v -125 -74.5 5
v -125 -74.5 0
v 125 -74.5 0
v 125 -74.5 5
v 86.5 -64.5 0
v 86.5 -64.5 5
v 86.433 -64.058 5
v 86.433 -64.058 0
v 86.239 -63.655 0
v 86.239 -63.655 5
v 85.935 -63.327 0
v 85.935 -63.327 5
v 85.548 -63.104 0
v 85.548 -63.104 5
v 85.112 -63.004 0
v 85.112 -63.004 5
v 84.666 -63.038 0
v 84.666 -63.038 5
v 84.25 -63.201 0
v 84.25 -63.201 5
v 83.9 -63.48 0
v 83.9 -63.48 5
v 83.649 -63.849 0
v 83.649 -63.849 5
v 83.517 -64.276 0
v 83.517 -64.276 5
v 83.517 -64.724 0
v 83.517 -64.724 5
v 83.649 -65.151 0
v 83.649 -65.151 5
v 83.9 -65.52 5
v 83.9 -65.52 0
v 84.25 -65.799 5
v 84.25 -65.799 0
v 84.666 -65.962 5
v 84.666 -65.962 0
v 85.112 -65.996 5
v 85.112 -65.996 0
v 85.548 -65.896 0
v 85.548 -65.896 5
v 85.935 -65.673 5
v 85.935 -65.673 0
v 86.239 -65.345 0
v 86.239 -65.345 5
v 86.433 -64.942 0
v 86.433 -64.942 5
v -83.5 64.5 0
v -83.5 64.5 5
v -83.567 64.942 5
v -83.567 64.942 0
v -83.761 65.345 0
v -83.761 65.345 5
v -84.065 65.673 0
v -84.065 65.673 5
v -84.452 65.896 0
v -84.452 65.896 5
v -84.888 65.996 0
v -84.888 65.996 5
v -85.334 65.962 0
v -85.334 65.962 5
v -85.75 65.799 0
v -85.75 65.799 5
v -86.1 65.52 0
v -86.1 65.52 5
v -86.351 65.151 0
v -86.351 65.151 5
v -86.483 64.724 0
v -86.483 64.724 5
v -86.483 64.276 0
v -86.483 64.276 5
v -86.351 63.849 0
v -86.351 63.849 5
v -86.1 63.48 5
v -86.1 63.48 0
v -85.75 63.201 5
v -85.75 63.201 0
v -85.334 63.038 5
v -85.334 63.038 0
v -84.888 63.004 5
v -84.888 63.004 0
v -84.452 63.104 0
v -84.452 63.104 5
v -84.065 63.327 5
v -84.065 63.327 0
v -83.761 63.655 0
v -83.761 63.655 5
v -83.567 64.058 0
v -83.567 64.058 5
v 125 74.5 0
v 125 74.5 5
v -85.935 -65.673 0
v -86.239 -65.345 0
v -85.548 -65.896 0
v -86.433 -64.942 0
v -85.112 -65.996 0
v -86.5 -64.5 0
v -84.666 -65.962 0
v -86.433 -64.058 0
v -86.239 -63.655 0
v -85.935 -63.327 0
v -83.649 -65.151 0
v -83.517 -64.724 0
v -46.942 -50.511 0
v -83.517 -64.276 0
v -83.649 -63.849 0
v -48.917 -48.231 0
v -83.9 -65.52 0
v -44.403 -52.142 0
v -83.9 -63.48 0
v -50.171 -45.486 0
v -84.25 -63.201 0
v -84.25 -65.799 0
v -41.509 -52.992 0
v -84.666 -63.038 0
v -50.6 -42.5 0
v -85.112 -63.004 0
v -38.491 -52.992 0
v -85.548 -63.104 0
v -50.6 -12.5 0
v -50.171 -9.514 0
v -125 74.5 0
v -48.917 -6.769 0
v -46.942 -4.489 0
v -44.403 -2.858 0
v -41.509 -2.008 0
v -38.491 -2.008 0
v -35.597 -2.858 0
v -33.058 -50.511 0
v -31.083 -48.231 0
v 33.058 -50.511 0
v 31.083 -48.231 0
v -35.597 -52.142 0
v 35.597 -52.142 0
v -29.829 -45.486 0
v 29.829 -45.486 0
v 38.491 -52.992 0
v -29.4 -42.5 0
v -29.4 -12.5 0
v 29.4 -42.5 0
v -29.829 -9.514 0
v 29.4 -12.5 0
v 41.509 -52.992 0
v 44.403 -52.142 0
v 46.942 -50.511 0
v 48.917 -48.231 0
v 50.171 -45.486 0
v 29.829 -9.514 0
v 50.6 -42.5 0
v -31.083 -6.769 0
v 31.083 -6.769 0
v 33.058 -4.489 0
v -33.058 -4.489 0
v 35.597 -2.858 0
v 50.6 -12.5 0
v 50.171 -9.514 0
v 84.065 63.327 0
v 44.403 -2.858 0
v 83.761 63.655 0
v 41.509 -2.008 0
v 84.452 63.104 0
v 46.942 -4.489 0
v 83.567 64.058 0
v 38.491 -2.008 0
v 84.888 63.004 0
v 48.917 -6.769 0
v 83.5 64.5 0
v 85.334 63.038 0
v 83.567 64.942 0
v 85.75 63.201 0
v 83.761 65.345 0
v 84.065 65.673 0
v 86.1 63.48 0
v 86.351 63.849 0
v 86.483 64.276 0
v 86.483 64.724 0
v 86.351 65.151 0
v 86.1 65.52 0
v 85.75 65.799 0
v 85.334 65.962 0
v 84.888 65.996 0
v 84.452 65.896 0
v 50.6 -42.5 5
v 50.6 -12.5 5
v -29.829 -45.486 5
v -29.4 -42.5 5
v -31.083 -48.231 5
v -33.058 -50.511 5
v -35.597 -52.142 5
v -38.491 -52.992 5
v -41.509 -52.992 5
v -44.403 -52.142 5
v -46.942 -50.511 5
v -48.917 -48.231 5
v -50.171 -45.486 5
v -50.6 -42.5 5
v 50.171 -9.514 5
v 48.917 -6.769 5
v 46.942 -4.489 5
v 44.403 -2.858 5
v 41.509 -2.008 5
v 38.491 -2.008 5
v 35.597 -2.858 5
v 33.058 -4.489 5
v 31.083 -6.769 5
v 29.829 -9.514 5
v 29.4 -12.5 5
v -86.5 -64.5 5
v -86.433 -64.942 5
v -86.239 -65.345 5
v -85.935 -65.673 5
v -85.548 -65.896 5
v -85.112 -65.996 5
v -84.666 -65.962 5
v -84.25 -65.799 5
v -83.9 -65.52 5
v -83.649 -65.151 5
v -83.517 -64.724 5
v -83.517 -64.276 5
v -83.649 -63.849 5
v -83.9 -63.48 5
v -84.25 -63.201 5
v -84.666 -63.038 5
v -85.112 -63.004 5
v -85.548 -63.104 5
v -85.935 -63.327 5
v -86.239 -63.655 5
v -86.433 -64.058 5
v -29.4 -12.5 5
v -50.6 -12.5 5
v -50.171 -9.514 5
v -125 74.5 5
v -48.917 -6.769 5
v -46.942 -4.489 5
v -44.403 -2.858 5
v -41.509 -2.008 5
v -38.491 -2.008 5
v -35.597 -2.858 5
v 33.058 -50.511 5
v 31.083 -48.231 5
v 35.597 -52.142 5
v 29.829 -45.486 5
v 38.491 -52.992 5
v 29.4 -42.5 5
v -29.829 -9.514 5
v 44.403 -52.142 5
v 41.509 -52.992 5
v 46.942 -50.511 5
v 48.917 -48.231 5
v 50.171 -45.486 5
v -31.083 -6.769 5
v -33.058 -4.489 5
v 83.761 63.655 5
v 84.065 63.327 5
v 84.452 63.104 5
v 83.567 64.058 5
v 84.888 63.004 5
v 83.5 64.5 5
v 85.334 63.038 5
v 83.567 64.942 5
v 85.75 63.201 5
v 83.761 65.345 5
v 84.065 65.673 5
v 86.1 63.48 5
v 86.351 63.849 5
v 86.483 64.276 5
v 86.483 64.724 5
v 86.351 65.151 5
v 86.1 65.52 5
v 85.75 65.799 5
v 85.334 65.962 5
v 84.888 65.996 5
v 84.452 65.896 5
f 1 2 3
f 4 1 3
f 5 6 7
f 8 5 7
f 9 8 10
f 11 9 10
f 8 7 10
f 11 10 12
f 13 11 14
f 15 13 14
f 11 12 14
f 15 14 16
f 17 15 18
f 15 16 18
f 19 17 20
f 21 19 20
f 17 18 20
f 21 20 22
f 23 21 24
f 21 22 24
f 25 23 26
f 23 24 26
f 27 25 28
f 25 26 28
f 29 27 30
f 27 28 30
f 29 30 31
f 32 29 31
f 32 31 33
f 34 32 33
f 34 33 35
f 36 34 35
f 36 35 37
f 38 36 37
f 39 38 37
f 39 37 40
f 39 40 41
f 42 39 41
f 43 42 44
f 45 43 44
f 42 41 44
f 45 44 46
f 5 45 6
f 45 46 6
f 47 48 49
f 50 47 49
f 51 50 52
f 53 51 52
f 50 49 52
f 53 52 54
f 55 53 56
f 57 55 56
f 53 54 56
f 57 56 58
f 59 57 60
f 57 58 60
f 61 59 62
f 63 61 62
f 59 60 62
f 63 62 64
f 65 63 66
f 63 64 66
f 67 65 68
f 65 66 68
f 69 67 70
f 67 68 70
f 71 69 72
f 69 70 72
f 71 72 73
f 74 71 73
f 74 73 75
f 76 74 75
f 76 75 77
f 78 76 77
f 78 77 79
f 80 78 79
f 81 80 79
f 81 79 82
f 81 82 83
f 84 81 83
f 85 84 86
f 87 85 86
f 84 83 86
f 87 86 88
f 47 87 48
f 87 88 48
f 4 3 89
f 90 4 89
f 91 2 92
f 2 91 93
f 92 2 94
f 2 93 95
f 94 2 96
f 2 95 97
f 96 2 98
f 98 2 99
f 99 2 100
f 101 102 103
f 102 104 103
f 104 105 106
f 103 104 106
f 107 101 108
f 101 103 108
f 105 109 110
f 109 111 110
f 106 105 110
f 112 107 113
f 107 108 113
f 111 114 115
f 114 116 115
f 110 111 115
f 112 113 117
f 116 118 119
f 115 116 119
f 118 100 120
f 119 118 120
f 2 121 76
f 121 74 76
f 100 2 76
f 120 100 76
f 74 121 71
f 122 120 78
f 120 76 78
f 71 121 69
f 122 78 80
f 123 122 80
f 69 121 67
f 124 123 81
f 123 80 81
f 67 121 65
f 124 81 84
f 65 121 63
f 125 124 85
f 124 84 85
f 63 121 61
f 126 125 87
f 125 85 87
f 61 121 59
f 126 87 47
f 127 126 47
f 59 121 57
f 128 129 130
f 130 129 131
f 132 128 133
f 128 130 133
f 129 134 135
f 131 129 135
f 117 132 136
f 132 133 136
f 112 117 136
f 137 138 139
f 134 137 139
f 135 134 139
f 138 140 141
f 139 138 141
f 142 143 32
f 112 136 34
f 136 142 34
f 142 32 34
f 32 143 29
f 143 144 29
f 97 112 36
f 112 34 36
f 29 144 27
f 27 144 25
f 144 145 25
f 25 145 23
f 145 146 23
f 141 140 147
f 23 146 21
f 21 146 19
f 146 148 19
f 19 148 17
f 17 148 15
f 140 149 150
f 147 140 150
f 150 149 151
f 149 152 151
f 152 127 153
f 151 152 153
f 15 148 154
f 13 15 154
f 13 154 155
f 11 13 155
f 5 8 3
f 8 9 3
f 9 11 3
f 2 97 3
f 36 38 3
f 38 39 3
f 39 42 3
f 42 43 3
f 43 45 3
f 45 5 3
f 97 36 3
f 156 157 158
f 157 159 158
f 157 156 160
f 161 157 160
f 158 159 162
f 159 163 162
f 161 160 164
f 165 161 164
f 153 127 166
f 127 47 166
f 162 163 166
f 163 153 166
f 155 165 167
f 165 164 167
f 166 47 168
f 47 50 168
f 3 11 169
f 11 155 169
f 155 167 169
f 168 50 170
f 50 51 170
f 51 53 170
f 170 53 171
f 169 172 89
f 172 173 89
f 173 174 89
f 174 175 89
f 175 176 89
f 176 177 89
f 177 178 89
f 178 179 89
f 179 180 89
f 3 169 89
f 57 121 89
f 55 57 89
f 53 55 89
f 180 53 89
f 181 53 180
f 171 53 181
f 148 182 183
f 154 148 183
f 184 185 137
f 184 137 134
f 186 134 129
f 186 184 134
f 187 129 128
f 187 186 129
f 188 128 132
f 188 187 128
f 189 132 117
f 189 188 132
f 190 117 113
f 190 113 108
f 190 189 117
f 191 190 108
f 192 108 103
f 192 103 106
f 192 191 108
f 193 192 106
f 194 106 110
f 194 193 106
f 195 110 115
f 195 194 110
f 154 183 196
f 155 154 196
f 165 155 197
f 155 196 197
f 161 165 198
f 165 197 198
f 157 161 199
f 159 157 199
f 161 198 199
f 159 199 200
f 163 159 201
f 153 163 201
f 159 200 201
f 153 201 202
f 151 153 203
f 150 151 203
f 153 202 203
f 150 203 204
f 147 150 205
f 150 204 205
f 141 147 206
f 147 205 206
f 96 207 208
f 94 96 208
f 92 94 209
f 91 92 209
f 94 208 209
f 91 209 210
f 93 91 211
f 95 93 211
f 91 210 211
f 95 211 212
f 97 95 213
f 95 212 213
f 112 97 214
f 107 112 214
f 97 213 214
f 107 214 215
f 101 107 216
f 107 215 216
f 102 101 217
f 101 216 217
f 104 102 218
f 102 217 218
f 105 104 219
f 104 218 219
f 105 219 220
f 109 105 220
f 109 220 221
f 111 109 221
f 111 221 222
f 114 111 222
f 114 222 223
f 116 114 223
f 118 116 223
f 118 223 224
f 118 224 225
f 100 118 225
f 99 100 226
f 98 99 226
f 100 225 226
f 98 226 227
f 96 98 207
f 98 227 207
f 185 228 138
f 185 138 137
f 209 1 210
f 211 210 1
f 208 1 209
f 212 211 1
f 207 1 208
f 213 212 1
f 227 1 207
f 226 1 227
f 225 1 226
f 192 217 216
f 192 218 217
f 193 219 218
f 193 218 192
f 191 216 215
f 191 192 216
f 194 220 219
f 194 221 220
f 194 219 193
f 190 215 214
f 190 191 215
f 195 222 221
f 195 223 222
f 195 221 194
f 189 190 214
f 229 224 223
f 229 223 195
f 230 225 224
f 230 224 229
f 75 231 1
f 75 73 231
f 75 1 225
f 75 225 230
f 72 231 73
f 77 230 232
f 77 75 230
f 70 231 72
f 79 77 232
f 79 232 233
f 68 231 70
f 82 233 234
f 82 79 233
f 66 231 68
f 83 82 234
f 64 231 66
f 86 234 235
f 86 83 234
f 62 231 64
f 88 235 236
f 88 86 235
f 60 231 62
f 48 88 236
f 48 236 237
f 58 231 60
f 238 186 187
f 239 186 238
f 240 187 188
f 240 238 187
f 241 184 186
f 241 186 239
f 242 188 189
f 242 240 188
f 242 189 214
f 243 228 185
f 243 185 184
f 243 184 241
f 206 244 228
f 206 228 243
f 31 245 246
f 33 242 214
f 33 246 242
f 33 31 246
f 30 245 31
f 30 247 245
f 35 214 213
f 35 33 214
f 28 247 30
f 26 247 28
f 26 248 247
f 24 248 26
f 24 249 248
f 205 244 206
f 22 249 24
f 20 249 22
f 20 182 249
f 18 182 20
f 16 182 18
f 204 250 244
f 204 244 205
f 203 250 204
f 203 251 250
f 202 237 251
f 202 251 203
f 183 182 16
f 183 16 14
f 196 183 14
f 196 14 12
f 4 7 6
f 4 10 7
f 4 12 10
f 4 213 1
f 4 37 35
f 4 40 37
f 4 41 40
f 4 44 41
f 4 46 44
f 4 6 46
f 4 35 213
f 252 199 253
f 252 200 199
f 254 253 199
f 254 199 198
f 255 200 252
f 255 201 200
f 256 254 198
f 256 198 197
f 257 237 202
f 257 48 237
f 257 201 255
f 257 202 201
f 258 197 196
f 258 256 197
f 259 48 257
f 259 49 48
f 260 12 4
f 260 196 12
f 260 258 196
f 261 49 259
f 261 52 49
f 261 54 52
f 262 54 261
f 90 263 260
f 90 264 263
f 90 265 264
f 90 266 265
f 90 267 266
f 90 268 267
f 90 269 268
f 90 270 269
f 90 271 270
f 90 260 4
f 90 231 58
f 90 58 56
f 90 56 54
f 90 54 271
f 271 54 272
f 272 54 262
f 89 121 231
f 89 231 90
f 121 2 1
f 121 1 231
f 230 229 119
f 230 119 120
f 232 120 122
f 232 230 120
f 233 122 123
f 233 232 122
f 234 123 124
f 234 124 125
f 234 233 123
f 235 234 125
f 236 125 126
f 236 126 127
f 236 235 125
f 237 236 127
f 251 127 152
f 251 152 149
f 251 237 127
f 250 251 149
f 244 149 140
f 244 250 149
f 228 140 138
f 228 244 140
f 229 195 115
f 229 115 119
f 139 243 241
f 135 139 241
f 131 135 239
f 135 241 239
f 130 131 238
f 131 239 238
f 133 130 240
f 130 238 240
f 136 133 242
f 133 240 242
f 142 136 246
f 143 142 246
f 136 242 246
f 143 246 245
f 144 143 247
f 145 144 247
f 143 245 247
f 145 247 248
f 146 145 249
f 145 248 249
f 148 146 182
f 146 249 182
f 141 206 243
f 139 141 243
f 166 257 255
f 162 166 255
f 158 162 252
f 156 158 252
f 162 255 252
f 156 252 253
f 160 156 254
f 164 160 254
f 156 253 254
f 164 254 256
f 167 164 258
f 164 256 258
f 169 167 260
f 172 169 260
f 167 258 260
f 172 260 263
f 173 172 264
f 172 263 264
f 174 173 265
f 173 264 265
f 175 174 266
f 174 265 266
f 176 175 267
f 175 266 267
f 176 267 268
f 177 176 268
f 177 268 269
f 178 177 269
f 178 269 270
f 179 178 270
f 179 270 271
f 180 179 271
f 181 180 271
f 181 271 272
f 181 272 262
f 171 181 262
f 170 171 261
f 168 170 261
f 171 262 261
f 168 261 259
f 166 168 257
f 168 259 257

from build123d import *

# Parameters (mm, degrees)
ESQUISSE1_W             = 250
ESQUISSE1_H             = 149
BOSS_EXTRU_1_DEPTH      = 5
ESQUISSE2_R             = 1.5
ENL_V_MAT_EXTRU_1_DEPTH = 5
ENL_V_MAT_EXTRU_2_DEPTH = 5


with BuildPart() as part:
    # Esquisse1 → Boss.-Extru.1 (new body)
    with BuildSketch(Plane.XY):
        Rectangle(ESQUISSE1_W, ESQUISSE1_H)
    extrude(amount=BOSS_EXTRU_1_DEPTH)

    # Esquisse2 → Enlèv. mat.-Extru.1 (cut)
    with BuildSketch(Plane.XY.offset(5)):
        with Locations((-85, 64.5)):
            Circle(ESQUISSE2_R)
        with Locations(Location((-85, -64.5, 0), (0, 0, 180))):
            Circle(ESQUISSE2_R)
        with Locations((85, -64.5)):
            Circle(ESQUISSE2_R)
        with Locations(Location((85, 64.5, 0), (0, 0, 180))):
            Circle(ESQUISSE2_R)
    extrude(amount=-ENL_V_MAT_EXTRU_1_DEPTH, mode=Mode.SUBTRACT)

    # Esquisse3 → Enlèv. mat.-Extru.2 (cut)
    with BuildSketch(Plane.XY.offset(5)):
        with BuildLine():
            Line((-29.4, -12.5), (-29.4, -42.5))
            ThreePointArc((-29.4, -42.5), (-40, -53.1), (-50.6, -42.5))
            Line((-50.6, -42.5), (-50.6, -12.5))
            ThreePointArc((-50.6, -12.5), (-40, -1.9), (-29.4, -12.5))
        make_face()
        with BuildLine():
            Line((29.4, -12.5), (29.4, -42.5))
            ThreePointArc((29.4, -42.5), (40, -53.1), (50.6, -42.5))
            Line((50.6, -42.5), (50.6, -12.5))
            ThreePointArc((50.6, -12.5), (40, -1.9), (29.4, -12.5))
        make_face()
    extrude(amount=-ENL_V_MAT_EXTRU_2_DEPTH, mode=Mode.SUBTRACT)


solid = part.part
